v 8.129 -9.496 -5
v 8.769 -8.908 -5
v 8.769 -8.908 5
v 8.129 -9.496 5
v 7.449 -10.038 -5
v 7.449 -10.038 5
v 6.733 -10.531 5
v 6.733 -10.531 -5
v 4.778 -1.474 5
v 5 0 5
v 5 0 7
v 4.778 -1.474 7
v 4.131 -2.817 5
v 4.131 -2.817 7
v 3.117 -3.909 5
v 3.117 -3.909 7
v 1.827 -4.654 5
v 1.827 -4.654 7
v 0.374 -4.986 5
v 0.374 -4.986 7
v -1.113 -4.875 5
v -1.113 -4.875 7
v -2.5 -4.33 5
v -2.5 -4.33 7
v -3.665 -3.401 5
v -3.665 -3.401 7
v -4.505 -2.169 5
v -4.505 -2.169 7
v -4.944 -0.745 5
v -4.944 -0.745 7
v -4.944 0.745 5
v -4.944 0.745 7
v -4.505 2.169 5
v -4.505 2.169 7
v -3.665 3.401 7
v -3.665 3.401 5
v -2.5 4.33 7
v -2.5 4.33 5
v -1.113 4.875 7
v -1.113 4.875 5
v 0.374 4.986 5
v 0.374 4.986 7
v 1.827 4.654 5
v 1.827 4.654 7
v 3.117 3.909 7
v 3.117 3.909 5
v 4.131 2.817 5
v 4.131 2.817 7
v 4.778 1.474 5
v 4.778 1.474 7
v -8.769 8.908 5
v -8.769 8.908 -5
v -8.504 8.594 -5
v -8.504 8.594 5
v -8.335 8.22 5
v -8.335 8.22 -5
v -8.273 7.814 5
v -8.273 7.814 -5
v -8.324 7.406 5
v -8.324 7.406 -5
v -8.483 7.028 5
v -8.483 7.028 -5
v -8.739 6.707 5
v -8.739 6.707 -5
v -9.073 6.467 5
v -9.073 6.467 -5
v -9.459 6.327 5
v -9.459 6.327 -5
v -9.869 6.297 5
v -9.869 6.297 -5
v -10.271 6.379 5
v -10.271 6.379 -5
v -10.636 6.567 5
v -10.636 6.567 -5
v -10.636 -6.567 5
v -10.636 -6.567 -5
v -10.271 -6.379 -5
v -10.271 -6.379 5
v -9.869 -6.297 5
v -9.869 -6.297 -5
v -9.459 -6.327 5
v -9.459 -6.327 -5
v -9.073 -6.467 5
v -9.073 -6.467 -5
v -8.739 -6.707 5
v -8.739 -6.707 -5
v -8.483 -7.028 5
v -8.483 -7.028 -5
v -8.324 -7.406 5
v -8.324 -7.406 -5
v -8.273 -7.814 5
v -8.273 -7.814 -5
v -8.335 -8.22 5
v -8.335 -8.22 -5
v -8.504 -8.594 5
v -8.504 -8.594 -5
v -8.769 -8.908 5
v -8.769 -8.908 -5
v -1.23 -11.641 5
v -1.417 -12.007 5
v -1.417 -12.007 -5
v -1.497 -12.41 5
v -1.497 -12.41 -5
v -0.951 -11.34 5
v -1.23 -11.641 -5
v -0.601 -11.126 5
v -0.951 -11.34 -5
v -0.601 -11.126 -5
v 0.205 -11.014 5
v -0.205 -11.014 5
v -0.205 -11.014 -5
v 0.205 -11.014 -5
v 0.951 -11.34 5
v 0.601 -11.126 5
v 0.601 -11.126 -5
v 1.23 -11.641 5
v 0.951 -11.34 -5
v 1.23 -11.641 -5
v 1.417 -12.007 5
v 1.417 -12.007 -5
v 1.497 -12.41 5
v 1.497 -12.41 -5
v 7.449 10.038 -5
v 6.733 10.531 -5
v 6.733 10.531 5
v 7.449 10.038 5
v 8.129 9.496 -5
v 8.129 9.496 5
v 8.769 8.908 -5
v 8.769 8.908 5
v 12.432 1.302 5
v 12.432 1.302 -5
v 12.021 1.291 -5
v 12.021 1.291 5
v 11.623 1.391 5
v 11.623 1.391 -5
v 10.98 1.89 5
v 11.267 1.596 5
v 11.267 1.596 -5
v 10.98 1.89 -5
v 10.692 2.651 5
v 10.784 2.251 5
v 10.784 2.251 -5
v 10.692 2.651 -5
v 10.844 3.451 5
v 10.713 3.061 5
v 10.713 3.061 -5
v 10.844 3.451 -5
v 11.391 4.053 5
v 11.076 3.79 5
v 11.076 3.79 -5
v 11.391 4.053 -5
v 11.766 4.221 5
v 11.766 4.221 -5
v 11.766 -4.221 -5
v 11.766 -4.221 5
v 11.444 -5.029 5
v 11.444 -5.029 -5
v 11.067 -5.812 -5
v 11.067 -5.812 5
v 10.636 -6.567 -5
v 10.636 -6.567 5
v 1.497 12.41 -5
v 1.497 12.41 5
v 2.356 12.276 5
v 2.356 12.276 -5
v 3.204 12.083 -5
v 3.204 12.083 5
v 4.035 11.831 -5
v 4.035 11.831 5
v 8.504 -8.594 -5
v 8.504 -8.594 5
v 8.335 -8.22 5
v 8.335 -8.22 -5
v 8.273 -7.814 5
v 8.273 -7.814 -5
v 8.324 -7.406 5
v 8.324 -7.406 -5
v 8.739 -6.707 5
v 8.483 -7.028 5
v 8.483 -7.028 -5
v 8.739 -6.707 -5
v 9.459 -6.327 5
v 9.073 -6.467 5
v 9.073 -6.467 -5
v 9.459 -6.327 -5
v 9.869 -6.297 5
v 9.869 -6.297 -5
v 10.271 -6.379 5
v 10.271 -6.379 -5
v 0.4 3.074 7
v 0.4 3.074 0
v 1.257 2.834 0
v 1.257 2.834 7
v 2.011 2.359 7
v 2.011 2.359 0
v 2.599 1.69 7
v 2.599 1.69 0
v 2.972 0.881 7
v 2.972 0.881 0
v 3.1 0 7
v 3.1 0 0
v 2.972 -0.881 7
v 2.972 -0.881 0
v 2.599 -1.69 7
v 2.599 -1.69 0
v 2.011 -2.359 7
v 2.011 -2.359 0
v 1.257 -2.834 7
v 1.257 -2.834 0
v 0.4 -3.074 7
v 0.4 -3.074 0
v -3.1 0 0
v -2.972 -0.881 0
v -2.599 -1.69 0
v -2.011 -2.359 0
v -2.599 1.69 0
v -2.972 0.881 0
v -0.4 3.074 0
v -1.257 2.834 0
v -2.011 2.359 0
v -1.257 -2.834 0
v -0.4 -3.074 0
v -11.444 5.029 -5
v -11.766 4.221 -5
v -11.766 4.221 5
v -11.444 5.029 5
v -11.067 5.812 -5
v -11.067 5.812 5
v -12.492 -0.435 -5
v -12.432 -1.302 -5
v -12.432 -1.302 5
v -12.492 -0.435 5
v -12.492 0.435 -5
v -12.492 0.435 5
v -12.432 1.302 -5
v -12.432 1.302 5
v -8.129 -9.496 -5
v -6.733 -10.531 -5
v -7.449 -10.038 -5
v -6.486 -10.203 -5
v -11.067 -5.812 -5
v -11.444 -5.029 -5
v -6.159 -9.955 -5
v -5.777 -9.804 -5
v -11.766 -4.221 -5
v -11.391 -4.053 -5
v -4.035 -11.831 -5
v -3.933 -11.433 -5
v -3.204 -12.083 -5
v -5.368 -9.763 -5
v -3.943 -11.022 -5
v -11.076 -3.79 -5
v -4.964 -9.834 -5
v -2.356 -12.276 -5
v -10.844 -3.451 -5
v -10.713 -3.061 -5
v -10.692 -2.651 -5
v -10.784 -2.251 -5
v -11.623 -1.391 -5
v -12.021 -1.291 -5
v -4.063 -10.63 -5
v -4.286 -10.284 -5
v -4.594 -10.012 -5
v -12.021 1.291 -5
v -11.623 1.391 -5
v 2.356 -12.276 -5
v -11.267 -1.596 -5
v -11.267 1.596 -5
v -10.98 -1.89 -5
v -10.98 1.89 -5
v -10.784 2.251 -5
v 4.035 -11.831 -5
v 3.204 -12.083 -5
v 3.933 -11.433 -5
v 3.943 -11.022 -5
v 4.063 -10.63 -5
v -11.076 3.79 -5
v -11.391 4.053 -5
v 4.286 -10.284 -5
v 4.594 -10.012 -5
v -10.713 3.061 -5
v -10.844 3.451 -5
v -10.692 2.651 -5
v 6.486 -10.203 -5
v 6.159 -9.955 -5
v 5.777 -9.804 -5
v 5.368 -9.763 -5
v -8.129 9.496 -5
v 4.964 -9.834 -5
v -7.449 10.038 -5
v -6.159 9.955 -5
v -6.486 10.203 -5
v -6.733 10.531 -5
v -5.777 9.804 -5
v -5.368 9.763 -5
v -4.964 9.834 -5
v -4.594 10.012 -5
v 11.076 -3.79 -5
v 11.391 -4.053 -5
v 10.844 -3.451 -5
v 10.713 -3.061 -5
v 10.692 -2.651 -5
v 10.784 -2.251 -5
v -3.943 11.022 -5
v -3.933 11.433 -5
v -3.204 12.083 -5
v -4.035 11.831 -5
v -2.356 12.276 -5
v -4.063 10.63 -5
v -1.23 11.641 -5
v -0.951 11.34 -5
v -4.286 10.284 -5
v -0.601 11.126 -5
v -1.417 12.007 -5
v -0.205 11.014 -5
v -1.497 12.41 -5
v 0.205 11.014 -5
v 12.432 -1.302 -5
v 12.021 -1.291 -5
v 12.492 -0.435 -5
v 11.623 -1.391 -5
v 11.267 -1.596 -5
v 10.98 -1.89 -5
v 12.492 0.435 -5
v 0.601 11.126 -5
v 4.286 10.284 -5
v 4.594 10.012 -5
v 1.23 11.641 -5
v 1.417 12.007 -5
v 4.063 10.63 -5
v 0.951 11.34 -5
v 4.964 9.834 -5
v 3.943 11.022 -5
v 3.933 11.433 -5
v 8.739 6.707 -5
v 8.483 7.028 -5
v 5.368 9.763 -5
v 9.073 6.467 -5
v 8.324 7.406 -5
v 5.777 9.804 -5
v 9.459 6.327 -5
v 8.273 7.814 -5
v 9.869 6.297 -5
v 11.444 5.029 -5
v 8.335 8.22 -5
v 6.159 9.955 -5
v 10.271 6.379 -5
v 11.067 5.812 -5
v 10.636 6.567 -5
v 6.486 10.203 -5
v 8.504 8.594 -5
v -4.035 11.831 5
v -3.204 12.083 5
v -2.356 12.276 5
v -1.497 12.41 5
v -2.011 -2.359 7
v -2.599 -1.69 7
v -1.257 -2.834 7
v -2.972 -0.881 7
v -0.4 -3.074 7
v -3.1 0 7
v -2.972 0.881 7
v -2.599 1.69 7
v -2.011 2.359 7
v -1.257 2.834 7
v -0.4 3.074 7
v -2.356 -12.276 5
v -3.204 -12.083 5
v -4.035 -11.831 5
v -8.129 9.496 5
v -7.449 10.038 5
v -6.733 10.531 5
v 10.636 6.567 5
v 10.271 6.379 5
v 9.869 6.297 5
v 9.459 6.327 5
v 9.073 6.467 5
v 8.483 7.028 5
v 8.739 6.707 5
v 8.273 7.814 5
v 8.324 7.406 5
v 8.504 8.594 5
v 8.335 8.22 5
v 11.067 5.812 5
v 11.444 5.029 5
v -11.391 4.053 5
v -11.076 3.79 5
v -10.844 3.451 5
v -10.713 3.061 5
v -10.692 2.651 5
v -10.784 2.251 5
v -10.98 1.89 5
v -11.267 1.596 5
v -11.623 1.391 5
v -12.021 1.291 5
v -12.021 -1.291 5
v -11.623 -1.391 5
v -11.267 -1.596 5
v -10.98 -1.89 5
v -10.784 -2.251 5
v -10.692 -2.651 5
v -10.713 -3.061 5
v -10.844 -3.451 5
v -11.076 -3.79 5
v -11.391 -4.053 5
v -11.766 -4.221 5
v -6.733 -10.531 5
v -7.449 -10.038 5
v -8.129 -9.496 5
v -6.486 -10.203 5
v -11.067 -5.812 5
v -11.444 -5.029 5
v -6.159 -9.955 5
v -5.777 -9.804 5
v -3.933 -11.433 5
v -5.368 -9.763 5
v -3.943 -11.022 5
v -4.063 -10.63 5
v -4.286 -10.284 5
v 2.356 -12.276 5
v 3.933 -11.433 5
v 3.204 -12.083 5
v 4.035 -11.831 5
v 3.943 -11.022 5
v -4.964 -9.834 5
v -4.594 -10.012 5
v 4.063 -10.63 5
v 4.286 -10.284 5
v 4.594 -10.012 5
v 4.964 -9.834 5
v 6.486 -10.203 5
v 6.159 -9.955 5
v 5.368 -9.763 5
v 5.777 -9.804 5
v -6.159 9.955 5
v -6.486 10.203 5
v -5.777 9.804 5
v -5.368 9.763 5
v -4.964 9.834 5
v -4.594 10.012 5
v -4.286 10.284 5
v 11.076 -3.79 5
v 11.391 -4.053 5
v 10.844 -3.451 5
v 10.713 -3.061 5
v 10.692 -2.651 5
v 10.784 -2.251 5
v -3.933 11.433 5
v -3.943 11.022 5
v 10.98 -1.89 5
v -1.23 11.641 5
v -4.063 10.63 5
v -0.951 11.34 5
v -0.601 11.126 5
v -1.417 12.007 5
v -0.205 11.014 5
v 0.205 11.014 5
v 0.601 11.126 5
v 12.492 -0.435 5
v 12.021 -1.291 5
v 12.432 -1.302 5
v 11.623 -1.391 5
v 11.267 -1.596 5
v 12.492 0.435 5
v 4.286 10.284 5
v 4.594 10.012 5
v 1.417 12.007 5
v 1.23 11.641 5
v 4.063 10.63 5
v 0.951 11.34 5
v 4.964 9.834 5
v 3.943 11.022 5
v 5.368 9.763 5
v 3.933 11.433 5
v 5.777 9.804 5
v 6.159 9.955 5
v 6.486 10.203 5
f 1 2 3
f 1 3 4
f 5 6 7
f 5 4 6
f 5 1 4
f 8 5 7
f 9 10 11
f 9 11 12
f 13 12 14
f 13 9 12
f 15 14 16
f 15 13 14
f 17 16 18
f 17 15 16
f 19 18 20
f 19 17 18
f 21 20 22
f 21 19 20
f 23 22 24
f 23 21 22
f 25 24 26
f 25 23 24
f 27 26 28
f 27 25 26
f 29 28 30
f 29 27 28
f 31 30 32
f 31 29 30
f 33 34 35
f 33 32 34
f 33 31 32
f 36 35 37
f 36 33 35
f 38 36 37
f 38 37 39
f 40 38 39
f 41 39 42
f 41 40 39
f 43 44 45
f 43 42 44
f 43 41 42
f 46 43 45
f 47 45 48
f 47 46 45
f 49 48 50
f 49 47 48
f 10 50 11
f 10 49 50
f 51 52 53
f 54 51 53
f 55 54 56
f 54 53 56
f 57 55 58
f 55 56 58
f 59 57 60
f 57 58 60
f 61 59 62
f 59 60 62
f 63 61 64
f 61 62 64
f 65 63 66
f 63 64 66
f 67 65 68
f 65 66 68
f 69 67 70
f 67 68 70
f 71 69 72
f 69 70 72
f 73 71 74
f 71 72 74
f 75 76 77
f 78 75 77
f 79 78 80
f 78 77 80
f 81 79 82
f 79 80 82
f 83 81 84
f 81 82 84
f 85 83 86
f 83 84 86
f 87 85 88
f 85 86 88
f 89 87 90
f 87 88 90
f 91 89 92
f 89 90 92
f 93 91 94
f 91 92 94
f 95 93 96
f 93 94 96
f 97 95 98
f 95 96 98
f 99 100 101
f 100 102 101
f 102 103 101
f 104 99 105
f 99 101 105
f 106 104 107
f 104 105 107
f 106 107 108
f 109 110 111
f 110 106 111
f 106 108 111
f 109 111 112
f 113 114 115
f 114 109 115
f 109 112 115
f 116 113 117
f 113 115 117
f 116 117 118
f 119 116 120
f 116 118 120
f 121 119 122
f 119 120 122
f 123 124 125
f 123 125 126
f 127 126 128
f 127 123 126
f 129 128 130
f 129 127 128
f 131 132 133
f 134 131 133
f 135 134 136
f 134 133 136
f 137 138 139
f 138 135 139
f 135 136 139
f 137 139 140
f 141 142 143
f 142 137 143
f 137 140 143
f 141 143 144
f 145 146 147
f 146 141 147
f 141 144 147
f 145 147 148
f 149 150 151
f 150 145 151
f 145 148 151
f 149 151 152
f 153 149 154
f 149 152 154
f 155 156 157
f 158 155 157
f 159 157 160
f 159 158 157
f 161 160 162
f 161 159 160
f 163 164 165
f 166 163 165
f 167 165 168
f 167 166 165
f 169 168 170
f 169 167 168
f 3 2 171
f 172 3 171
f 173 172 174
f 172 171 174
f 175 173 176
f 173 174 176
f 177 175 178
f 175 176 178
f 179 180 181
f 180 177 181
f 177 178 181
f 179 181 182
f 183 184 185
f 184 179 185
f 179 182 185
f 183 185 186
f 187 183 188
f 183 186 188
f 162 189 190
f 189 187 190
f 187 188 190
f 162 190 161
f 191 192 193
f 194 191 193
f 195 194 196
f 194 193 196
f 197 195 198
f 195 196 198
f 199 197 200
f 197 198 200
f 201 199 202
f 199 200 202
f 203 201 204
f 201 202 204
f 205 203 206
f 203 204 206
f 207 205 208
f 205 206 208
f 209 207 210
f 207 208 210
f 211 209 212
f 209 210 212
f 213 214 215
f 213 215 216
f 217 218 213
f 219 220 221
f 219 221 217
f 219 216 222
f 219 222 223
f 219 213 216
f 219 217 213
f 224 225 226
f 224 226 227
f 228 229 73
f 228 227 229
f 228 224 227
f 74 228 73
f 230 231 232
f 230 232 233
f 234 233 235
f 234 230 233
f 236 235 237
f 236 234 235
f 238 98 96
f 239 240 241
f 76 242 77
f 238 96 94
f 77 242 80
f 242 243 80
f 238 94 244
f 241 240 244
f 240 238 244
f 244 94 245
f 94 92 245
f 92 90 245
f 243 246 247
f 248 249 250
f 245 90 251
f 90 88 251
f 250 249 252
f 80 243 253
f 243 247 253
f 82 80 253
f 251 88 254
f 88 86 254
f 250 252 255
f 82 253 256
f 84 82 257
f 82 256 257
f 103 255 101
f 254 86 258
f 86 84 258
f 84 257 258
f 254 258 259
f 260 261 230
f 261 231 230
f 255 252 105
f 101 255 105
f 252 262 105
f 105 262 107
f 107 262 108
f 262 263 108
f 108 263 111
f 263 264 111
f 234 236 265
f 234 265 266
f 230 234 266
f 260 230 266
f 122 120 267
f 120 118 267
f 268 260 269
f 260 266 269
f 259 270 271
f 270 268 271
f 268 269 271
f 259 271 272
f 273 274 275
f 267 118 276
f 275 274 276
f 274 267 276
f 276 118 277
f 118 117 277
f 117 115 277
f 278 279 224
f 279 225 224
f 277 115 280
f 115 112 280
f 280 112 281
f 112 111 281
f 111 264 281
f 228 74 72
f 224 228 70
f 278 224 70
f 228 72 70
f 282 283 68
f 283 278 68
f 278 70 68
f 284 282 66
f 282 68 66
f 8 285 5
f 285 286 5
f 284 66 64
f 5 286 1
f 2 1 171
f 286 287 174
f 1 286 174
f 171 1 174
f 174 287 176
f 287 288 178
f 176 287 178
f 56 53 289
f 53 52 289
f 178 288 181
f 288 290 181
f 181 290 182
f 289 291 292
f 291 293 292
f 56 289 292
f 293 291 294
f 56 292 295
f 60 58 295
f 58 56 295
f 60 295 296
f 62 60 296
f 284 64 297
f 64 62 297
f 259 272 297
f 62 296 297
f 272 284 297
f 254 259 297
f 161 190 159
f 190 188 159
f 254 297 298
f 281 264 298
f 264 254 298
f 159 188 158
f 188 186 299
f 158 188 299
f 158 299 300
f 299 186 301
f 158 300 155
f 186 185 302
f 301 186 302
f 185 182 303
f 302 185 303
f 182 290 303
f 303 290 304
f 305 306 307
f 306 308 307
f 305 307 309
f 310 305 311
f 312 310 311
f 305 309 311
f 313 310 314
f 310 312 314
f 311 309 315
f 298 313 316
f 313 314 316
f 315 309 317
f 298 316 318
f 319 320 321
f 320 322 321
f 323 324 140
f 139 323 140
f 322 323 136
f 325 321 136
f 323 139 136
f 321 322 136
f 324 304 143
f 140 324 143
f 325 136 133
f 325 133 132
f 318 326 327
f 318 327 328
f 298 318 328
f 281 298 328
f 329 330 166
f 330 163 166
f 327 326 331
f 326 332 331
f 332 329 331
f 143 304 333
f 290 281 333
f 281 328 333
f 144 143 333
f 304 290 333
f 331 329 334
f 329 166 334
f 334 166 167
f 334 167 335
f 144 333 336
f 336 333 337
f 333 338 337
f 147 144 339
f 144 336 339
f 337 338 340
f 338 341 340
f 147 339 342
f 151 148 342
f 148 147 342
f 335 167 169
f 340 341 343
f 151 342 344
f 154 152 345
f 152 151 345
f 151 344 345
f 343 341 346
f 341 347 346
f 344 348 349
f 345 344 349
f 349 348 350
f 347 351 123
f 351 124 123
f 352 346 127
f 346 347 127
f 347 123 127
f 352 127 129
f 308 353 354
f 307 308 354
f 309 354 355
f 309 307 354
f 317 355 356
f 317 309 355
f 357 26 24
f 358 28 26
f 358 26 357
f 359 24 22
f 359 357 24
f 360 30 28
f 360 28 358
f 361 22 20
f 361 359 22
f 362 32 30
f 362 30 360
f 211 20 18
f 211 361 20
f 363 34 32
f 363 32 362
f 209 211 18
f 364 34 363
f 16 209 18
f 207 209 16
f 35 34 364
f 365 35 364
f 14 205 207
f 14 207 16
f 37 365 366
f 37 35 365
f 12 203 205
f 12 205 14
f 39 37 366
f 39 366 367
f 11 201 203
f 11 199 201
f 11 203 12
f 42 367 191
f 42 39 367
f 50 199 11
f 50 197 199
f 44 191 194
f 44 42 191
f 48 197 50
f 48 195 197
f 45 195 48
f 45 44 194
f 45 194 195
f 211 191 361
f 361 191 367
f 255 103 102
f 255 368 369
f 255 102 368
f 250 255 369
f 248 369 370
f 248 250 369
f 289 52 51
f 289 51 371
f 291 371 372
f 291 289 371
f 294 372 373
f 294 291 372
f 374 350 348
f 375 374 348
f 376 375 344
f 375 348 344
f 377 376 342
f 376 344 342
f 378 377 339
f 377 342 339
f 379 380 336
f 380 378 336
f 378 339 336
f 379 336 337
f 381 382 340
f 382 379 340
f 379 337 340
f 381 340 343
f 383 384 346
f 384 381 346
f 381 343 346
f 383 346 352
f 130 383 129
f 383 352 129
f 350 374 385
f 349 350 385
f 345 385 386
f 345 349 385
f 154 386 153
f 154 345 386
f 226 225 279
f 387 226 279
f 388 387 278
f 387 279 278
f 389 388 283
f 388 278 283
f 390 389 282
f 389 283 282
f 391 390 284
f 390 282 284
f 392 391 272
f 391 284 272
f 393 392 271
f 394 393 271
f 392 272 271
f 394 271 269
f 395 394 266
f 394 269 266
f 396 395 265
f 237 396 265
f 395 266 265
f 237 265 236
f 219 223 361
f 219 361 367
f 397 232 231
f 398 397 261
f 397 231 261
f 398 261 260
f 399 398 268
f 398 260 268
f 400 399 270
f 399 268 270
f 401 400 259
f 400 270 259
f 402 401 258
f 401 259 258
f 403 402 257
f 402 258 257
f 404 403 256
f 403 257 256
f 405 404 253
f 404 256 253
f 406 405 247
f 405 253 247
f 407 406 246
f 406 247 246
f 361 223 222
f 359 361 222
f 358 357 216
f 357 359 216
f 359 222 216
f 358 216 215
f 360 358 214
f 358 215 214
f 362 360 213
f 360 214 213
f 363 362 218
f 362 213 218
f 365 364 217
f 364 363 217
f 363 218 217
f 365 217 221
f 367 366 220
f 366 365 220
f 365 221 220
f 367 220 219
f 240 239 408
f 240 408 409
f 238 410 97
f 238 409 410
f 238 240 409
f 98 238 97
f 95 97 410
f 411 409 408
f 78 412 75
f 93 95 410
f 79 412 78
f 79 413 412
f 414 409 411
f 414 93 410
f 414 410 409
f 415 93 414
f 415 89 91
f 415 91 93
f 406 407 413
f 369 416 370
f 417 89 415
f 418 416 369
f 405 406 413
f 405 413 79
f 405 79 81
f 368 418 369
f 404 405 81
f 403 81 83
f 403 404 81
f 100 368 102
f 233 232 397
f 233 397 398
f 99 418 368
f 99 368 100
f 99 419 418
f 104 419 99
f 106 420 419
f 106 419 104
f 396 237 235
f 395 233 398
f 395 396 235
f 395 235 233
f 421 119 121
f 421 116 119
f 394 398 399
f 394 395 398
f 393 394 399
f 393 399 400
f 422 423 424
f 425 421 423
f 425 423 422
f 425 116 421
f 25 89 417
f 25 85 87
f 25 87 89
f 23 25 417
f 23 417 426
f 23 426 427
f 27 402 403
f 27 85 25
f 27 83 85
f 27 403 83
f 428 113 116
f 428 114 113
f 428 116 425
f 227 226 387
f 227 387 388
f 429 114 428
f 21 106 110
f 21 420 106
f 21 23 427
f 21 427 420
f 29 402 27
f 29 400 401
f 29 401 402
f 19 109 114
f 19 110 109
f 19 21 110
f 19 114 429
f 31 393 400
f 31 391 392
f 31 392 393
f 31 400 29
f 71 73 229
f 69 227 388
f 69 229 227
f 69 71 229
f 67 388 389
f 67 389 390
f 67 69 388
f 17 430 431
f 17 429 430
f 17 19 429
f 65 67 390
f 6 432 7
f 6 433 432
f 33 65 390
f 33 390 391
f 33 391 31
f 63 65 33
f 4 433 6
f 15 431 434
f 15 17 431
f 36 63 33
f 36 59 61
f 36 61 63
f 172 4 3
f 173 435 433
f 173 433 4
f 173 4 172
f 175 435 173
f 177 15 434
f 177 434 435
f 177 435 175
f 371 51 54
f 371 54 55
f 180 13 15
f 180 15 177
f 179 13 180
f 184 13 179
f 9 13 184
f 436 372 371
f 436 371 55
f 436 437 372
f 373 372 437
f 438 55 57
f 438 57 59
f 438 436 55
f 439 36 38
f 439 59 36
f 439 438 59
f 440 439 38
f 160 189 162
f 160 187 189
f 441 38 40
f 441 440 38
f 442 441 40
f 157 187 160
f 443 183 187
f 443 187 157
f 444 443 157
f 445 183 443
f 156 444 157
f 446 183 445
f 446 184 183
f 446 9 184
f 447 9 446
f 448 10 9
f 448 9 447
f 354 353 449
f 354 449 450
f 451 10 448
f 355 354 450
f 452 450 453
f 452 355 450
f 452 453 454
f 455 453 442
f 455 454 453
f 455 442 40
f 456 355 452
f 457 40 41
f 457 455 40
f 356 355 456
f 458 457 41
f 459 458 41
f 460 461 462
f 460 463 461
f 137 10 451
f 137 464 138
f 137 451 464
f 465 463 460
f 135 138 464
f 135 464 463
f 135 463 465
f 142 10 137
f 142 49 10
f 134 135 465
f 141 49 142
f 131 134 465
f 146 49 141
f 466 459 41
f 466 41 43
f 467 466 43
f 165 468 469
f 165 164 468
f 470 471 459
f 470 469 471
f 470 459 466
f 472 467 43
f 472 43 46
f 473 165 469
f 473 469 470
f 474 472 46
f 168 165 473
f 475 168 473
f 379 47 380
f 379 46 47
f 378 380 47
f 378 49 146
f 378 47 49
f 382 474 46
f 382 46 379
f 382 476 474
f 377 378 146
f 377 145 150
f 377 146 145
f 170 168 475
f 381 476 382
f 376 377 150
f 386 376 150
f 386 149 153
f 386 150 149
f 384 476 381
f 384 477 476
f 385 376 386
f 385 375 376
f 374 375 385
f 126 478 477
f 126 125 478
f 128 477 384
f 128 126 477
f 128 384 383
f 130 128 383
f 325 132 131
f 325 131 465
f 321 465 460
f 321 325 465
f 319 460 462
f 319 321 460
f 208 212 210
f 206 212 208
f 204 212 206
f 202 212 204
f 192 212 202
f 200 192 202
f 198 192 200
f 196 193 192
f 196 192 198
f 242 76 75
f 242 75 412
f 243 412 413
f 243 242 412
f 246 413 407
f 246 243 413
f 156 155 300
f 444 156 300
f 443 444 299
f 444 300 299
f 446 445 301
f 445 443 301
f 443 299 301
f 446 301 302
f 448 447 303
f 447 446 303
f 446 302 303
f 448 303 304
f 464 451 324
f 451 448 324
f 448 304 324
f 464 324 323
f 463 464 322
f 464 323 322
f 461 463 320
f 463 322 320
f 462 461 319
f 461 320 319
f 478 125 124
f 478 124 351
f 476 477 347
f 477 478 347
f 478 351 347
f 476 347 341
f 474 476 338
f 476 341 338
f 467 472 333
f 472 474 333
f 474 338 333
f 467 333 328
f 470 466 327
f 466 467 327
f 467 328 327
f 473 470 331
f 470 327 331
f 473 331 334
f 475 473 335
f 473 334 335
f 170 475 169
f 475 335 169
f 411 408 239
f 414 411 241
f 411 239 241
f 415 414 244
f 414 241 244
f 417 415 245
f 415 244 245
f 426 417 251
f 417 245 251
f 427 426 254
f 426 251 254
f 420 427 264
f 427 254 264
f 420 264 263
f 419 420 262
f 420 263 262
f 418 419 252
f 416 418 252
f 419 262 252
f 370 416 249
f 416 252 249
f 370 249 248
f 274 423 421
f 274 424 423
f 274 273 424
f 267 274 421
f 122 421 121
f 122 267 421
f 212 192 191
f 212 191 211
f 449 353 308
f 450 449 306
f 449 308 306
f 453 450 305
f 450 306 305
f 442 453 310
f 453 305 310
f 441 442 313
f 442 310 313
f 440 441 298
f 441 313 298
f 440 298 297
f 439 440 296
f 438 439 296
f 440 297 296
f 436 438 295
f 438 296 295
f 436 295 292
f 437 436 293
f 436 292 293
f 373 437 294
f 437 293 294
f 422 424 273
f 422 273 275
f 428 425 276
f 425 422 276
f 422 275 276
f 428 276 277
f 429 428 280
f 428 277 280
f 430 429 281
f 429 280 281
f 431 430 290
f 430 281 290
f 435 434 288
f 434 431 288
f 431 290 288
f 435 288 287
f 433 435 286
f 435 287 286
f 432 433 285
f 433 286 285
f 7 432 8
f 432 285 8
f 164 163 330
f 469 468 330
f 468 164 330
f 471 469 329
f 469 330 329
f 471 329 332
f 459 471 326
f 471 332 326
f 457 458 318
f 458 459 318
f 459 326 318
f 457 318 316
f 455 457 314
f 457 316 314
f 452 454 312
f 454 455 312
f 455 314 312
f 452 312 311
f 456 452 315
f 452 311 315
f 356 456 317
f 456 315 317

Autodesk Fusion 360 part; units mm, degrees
sketch "Sketch1" plane through (0, 0, 0) normal (0, 0, 1) x (1, 0, 0)
  circle A0 centre (0, 0) radius 3.1
  line L0 (-0.4, 3.1) -> (0.4, 3.1)
  line L1 (0.4, 3.1) -> (0.4, -3.1)
  line L2 (0.4, -3.1) -> (-0.4, -3.1)
  line L3 (-0.4, -3.1) -> (-0.4, 3.1)
  line L4 (0, 0) -> (0, 3.1)
  circle A1 centre (0, 0) radius 5
  dimension "d1" = 6.2
  dimension "d2" = 0.8
  dimension "d3" = 6.2
  dimension "d4" = 10
extrude "Extrude1" add sketch "Sketch1" along normal blind 7 contours A0 L1 L3 | A0 L0 L1 | A0 L1 L2 | A0 L0 L3 | A0 L2 L3 | A1
sketch "Sketch2" plane through (0, 0, 0) normal (0, 0, 1) x (1, 0, 0)
  circle A0 centre (0, 0) radius 12.5
  circle A1 centre (0, -12.5) radius 1.5
  circle A2 centre (5.4235, -11.2621) radius 1.5
  circle A3 centre (9.7729, -7.7936) radius 1.5
  circle A4 centre (12.1866, -2.7815) radius 1.5
  circle A5 centre (12.1866, 2.7815) radius 1.5
  circle A6 centre (9.7729, 7.7936) radius 1.5
  circle A7 centre (5.4235, 11.2621) radius 1.5
  circle A8 centre (0, 12.5) radius 1.5
  circle A9 centre (-5.4235, 11.2621) radius 1.5
  circle A10 centre (-9.7729, 7.7936) radius 1.5
  circle A11 centre (-12.1866, 2.7815) radius 1.5
  circle A12 centre (-12.1866, -2.7815) radius 1.5
  circle A13 centre (-9.7729, -7.7936) radius 1.5
  circle A14 centre (-5.4235, -11.2621) radius 1.5
  circle A15 centre (0, 0) radius 5
  line L0 (12.5, 0.6) -> (5.5, 0.6)
  line L1 (5.5, 0.6) -> (5.5, -0.6)
  line L2 (5.5, -0.6) -> (12.5, -0.6)
  line L3 (12.5, -0.6) -> (12.5, 0.6)
  line L4 (0, 0) -> (12.5, 0)
  dimension "d7" = 25
  dimension "d8" = 3
  dimension "d10" = 360
  dimension "d13" = 10
  dimension "d16" = 7
  dimension "d17" = 1.2
extrude "Extrude2" add sketch "Sketch2" against normal blind 5 contours A0 L0 L1 L4 | A0 L1 L2 L4 | A15 | A0 A1 A2 A3 A4 A5 A6 A7 A8 A9 A10 A11 A12 A13 A14 L0 L1 L2
extrude "Extrude3" add sketch "Sketch2" along normal blind 5 contours A0 L0 L1 L4 | A0 L1 L2 L4 | A0 A1 A2 A3 A4 A5 A6 A7 A8 A9 A10 A11 A12 A13 A14 L0 L1 L2
